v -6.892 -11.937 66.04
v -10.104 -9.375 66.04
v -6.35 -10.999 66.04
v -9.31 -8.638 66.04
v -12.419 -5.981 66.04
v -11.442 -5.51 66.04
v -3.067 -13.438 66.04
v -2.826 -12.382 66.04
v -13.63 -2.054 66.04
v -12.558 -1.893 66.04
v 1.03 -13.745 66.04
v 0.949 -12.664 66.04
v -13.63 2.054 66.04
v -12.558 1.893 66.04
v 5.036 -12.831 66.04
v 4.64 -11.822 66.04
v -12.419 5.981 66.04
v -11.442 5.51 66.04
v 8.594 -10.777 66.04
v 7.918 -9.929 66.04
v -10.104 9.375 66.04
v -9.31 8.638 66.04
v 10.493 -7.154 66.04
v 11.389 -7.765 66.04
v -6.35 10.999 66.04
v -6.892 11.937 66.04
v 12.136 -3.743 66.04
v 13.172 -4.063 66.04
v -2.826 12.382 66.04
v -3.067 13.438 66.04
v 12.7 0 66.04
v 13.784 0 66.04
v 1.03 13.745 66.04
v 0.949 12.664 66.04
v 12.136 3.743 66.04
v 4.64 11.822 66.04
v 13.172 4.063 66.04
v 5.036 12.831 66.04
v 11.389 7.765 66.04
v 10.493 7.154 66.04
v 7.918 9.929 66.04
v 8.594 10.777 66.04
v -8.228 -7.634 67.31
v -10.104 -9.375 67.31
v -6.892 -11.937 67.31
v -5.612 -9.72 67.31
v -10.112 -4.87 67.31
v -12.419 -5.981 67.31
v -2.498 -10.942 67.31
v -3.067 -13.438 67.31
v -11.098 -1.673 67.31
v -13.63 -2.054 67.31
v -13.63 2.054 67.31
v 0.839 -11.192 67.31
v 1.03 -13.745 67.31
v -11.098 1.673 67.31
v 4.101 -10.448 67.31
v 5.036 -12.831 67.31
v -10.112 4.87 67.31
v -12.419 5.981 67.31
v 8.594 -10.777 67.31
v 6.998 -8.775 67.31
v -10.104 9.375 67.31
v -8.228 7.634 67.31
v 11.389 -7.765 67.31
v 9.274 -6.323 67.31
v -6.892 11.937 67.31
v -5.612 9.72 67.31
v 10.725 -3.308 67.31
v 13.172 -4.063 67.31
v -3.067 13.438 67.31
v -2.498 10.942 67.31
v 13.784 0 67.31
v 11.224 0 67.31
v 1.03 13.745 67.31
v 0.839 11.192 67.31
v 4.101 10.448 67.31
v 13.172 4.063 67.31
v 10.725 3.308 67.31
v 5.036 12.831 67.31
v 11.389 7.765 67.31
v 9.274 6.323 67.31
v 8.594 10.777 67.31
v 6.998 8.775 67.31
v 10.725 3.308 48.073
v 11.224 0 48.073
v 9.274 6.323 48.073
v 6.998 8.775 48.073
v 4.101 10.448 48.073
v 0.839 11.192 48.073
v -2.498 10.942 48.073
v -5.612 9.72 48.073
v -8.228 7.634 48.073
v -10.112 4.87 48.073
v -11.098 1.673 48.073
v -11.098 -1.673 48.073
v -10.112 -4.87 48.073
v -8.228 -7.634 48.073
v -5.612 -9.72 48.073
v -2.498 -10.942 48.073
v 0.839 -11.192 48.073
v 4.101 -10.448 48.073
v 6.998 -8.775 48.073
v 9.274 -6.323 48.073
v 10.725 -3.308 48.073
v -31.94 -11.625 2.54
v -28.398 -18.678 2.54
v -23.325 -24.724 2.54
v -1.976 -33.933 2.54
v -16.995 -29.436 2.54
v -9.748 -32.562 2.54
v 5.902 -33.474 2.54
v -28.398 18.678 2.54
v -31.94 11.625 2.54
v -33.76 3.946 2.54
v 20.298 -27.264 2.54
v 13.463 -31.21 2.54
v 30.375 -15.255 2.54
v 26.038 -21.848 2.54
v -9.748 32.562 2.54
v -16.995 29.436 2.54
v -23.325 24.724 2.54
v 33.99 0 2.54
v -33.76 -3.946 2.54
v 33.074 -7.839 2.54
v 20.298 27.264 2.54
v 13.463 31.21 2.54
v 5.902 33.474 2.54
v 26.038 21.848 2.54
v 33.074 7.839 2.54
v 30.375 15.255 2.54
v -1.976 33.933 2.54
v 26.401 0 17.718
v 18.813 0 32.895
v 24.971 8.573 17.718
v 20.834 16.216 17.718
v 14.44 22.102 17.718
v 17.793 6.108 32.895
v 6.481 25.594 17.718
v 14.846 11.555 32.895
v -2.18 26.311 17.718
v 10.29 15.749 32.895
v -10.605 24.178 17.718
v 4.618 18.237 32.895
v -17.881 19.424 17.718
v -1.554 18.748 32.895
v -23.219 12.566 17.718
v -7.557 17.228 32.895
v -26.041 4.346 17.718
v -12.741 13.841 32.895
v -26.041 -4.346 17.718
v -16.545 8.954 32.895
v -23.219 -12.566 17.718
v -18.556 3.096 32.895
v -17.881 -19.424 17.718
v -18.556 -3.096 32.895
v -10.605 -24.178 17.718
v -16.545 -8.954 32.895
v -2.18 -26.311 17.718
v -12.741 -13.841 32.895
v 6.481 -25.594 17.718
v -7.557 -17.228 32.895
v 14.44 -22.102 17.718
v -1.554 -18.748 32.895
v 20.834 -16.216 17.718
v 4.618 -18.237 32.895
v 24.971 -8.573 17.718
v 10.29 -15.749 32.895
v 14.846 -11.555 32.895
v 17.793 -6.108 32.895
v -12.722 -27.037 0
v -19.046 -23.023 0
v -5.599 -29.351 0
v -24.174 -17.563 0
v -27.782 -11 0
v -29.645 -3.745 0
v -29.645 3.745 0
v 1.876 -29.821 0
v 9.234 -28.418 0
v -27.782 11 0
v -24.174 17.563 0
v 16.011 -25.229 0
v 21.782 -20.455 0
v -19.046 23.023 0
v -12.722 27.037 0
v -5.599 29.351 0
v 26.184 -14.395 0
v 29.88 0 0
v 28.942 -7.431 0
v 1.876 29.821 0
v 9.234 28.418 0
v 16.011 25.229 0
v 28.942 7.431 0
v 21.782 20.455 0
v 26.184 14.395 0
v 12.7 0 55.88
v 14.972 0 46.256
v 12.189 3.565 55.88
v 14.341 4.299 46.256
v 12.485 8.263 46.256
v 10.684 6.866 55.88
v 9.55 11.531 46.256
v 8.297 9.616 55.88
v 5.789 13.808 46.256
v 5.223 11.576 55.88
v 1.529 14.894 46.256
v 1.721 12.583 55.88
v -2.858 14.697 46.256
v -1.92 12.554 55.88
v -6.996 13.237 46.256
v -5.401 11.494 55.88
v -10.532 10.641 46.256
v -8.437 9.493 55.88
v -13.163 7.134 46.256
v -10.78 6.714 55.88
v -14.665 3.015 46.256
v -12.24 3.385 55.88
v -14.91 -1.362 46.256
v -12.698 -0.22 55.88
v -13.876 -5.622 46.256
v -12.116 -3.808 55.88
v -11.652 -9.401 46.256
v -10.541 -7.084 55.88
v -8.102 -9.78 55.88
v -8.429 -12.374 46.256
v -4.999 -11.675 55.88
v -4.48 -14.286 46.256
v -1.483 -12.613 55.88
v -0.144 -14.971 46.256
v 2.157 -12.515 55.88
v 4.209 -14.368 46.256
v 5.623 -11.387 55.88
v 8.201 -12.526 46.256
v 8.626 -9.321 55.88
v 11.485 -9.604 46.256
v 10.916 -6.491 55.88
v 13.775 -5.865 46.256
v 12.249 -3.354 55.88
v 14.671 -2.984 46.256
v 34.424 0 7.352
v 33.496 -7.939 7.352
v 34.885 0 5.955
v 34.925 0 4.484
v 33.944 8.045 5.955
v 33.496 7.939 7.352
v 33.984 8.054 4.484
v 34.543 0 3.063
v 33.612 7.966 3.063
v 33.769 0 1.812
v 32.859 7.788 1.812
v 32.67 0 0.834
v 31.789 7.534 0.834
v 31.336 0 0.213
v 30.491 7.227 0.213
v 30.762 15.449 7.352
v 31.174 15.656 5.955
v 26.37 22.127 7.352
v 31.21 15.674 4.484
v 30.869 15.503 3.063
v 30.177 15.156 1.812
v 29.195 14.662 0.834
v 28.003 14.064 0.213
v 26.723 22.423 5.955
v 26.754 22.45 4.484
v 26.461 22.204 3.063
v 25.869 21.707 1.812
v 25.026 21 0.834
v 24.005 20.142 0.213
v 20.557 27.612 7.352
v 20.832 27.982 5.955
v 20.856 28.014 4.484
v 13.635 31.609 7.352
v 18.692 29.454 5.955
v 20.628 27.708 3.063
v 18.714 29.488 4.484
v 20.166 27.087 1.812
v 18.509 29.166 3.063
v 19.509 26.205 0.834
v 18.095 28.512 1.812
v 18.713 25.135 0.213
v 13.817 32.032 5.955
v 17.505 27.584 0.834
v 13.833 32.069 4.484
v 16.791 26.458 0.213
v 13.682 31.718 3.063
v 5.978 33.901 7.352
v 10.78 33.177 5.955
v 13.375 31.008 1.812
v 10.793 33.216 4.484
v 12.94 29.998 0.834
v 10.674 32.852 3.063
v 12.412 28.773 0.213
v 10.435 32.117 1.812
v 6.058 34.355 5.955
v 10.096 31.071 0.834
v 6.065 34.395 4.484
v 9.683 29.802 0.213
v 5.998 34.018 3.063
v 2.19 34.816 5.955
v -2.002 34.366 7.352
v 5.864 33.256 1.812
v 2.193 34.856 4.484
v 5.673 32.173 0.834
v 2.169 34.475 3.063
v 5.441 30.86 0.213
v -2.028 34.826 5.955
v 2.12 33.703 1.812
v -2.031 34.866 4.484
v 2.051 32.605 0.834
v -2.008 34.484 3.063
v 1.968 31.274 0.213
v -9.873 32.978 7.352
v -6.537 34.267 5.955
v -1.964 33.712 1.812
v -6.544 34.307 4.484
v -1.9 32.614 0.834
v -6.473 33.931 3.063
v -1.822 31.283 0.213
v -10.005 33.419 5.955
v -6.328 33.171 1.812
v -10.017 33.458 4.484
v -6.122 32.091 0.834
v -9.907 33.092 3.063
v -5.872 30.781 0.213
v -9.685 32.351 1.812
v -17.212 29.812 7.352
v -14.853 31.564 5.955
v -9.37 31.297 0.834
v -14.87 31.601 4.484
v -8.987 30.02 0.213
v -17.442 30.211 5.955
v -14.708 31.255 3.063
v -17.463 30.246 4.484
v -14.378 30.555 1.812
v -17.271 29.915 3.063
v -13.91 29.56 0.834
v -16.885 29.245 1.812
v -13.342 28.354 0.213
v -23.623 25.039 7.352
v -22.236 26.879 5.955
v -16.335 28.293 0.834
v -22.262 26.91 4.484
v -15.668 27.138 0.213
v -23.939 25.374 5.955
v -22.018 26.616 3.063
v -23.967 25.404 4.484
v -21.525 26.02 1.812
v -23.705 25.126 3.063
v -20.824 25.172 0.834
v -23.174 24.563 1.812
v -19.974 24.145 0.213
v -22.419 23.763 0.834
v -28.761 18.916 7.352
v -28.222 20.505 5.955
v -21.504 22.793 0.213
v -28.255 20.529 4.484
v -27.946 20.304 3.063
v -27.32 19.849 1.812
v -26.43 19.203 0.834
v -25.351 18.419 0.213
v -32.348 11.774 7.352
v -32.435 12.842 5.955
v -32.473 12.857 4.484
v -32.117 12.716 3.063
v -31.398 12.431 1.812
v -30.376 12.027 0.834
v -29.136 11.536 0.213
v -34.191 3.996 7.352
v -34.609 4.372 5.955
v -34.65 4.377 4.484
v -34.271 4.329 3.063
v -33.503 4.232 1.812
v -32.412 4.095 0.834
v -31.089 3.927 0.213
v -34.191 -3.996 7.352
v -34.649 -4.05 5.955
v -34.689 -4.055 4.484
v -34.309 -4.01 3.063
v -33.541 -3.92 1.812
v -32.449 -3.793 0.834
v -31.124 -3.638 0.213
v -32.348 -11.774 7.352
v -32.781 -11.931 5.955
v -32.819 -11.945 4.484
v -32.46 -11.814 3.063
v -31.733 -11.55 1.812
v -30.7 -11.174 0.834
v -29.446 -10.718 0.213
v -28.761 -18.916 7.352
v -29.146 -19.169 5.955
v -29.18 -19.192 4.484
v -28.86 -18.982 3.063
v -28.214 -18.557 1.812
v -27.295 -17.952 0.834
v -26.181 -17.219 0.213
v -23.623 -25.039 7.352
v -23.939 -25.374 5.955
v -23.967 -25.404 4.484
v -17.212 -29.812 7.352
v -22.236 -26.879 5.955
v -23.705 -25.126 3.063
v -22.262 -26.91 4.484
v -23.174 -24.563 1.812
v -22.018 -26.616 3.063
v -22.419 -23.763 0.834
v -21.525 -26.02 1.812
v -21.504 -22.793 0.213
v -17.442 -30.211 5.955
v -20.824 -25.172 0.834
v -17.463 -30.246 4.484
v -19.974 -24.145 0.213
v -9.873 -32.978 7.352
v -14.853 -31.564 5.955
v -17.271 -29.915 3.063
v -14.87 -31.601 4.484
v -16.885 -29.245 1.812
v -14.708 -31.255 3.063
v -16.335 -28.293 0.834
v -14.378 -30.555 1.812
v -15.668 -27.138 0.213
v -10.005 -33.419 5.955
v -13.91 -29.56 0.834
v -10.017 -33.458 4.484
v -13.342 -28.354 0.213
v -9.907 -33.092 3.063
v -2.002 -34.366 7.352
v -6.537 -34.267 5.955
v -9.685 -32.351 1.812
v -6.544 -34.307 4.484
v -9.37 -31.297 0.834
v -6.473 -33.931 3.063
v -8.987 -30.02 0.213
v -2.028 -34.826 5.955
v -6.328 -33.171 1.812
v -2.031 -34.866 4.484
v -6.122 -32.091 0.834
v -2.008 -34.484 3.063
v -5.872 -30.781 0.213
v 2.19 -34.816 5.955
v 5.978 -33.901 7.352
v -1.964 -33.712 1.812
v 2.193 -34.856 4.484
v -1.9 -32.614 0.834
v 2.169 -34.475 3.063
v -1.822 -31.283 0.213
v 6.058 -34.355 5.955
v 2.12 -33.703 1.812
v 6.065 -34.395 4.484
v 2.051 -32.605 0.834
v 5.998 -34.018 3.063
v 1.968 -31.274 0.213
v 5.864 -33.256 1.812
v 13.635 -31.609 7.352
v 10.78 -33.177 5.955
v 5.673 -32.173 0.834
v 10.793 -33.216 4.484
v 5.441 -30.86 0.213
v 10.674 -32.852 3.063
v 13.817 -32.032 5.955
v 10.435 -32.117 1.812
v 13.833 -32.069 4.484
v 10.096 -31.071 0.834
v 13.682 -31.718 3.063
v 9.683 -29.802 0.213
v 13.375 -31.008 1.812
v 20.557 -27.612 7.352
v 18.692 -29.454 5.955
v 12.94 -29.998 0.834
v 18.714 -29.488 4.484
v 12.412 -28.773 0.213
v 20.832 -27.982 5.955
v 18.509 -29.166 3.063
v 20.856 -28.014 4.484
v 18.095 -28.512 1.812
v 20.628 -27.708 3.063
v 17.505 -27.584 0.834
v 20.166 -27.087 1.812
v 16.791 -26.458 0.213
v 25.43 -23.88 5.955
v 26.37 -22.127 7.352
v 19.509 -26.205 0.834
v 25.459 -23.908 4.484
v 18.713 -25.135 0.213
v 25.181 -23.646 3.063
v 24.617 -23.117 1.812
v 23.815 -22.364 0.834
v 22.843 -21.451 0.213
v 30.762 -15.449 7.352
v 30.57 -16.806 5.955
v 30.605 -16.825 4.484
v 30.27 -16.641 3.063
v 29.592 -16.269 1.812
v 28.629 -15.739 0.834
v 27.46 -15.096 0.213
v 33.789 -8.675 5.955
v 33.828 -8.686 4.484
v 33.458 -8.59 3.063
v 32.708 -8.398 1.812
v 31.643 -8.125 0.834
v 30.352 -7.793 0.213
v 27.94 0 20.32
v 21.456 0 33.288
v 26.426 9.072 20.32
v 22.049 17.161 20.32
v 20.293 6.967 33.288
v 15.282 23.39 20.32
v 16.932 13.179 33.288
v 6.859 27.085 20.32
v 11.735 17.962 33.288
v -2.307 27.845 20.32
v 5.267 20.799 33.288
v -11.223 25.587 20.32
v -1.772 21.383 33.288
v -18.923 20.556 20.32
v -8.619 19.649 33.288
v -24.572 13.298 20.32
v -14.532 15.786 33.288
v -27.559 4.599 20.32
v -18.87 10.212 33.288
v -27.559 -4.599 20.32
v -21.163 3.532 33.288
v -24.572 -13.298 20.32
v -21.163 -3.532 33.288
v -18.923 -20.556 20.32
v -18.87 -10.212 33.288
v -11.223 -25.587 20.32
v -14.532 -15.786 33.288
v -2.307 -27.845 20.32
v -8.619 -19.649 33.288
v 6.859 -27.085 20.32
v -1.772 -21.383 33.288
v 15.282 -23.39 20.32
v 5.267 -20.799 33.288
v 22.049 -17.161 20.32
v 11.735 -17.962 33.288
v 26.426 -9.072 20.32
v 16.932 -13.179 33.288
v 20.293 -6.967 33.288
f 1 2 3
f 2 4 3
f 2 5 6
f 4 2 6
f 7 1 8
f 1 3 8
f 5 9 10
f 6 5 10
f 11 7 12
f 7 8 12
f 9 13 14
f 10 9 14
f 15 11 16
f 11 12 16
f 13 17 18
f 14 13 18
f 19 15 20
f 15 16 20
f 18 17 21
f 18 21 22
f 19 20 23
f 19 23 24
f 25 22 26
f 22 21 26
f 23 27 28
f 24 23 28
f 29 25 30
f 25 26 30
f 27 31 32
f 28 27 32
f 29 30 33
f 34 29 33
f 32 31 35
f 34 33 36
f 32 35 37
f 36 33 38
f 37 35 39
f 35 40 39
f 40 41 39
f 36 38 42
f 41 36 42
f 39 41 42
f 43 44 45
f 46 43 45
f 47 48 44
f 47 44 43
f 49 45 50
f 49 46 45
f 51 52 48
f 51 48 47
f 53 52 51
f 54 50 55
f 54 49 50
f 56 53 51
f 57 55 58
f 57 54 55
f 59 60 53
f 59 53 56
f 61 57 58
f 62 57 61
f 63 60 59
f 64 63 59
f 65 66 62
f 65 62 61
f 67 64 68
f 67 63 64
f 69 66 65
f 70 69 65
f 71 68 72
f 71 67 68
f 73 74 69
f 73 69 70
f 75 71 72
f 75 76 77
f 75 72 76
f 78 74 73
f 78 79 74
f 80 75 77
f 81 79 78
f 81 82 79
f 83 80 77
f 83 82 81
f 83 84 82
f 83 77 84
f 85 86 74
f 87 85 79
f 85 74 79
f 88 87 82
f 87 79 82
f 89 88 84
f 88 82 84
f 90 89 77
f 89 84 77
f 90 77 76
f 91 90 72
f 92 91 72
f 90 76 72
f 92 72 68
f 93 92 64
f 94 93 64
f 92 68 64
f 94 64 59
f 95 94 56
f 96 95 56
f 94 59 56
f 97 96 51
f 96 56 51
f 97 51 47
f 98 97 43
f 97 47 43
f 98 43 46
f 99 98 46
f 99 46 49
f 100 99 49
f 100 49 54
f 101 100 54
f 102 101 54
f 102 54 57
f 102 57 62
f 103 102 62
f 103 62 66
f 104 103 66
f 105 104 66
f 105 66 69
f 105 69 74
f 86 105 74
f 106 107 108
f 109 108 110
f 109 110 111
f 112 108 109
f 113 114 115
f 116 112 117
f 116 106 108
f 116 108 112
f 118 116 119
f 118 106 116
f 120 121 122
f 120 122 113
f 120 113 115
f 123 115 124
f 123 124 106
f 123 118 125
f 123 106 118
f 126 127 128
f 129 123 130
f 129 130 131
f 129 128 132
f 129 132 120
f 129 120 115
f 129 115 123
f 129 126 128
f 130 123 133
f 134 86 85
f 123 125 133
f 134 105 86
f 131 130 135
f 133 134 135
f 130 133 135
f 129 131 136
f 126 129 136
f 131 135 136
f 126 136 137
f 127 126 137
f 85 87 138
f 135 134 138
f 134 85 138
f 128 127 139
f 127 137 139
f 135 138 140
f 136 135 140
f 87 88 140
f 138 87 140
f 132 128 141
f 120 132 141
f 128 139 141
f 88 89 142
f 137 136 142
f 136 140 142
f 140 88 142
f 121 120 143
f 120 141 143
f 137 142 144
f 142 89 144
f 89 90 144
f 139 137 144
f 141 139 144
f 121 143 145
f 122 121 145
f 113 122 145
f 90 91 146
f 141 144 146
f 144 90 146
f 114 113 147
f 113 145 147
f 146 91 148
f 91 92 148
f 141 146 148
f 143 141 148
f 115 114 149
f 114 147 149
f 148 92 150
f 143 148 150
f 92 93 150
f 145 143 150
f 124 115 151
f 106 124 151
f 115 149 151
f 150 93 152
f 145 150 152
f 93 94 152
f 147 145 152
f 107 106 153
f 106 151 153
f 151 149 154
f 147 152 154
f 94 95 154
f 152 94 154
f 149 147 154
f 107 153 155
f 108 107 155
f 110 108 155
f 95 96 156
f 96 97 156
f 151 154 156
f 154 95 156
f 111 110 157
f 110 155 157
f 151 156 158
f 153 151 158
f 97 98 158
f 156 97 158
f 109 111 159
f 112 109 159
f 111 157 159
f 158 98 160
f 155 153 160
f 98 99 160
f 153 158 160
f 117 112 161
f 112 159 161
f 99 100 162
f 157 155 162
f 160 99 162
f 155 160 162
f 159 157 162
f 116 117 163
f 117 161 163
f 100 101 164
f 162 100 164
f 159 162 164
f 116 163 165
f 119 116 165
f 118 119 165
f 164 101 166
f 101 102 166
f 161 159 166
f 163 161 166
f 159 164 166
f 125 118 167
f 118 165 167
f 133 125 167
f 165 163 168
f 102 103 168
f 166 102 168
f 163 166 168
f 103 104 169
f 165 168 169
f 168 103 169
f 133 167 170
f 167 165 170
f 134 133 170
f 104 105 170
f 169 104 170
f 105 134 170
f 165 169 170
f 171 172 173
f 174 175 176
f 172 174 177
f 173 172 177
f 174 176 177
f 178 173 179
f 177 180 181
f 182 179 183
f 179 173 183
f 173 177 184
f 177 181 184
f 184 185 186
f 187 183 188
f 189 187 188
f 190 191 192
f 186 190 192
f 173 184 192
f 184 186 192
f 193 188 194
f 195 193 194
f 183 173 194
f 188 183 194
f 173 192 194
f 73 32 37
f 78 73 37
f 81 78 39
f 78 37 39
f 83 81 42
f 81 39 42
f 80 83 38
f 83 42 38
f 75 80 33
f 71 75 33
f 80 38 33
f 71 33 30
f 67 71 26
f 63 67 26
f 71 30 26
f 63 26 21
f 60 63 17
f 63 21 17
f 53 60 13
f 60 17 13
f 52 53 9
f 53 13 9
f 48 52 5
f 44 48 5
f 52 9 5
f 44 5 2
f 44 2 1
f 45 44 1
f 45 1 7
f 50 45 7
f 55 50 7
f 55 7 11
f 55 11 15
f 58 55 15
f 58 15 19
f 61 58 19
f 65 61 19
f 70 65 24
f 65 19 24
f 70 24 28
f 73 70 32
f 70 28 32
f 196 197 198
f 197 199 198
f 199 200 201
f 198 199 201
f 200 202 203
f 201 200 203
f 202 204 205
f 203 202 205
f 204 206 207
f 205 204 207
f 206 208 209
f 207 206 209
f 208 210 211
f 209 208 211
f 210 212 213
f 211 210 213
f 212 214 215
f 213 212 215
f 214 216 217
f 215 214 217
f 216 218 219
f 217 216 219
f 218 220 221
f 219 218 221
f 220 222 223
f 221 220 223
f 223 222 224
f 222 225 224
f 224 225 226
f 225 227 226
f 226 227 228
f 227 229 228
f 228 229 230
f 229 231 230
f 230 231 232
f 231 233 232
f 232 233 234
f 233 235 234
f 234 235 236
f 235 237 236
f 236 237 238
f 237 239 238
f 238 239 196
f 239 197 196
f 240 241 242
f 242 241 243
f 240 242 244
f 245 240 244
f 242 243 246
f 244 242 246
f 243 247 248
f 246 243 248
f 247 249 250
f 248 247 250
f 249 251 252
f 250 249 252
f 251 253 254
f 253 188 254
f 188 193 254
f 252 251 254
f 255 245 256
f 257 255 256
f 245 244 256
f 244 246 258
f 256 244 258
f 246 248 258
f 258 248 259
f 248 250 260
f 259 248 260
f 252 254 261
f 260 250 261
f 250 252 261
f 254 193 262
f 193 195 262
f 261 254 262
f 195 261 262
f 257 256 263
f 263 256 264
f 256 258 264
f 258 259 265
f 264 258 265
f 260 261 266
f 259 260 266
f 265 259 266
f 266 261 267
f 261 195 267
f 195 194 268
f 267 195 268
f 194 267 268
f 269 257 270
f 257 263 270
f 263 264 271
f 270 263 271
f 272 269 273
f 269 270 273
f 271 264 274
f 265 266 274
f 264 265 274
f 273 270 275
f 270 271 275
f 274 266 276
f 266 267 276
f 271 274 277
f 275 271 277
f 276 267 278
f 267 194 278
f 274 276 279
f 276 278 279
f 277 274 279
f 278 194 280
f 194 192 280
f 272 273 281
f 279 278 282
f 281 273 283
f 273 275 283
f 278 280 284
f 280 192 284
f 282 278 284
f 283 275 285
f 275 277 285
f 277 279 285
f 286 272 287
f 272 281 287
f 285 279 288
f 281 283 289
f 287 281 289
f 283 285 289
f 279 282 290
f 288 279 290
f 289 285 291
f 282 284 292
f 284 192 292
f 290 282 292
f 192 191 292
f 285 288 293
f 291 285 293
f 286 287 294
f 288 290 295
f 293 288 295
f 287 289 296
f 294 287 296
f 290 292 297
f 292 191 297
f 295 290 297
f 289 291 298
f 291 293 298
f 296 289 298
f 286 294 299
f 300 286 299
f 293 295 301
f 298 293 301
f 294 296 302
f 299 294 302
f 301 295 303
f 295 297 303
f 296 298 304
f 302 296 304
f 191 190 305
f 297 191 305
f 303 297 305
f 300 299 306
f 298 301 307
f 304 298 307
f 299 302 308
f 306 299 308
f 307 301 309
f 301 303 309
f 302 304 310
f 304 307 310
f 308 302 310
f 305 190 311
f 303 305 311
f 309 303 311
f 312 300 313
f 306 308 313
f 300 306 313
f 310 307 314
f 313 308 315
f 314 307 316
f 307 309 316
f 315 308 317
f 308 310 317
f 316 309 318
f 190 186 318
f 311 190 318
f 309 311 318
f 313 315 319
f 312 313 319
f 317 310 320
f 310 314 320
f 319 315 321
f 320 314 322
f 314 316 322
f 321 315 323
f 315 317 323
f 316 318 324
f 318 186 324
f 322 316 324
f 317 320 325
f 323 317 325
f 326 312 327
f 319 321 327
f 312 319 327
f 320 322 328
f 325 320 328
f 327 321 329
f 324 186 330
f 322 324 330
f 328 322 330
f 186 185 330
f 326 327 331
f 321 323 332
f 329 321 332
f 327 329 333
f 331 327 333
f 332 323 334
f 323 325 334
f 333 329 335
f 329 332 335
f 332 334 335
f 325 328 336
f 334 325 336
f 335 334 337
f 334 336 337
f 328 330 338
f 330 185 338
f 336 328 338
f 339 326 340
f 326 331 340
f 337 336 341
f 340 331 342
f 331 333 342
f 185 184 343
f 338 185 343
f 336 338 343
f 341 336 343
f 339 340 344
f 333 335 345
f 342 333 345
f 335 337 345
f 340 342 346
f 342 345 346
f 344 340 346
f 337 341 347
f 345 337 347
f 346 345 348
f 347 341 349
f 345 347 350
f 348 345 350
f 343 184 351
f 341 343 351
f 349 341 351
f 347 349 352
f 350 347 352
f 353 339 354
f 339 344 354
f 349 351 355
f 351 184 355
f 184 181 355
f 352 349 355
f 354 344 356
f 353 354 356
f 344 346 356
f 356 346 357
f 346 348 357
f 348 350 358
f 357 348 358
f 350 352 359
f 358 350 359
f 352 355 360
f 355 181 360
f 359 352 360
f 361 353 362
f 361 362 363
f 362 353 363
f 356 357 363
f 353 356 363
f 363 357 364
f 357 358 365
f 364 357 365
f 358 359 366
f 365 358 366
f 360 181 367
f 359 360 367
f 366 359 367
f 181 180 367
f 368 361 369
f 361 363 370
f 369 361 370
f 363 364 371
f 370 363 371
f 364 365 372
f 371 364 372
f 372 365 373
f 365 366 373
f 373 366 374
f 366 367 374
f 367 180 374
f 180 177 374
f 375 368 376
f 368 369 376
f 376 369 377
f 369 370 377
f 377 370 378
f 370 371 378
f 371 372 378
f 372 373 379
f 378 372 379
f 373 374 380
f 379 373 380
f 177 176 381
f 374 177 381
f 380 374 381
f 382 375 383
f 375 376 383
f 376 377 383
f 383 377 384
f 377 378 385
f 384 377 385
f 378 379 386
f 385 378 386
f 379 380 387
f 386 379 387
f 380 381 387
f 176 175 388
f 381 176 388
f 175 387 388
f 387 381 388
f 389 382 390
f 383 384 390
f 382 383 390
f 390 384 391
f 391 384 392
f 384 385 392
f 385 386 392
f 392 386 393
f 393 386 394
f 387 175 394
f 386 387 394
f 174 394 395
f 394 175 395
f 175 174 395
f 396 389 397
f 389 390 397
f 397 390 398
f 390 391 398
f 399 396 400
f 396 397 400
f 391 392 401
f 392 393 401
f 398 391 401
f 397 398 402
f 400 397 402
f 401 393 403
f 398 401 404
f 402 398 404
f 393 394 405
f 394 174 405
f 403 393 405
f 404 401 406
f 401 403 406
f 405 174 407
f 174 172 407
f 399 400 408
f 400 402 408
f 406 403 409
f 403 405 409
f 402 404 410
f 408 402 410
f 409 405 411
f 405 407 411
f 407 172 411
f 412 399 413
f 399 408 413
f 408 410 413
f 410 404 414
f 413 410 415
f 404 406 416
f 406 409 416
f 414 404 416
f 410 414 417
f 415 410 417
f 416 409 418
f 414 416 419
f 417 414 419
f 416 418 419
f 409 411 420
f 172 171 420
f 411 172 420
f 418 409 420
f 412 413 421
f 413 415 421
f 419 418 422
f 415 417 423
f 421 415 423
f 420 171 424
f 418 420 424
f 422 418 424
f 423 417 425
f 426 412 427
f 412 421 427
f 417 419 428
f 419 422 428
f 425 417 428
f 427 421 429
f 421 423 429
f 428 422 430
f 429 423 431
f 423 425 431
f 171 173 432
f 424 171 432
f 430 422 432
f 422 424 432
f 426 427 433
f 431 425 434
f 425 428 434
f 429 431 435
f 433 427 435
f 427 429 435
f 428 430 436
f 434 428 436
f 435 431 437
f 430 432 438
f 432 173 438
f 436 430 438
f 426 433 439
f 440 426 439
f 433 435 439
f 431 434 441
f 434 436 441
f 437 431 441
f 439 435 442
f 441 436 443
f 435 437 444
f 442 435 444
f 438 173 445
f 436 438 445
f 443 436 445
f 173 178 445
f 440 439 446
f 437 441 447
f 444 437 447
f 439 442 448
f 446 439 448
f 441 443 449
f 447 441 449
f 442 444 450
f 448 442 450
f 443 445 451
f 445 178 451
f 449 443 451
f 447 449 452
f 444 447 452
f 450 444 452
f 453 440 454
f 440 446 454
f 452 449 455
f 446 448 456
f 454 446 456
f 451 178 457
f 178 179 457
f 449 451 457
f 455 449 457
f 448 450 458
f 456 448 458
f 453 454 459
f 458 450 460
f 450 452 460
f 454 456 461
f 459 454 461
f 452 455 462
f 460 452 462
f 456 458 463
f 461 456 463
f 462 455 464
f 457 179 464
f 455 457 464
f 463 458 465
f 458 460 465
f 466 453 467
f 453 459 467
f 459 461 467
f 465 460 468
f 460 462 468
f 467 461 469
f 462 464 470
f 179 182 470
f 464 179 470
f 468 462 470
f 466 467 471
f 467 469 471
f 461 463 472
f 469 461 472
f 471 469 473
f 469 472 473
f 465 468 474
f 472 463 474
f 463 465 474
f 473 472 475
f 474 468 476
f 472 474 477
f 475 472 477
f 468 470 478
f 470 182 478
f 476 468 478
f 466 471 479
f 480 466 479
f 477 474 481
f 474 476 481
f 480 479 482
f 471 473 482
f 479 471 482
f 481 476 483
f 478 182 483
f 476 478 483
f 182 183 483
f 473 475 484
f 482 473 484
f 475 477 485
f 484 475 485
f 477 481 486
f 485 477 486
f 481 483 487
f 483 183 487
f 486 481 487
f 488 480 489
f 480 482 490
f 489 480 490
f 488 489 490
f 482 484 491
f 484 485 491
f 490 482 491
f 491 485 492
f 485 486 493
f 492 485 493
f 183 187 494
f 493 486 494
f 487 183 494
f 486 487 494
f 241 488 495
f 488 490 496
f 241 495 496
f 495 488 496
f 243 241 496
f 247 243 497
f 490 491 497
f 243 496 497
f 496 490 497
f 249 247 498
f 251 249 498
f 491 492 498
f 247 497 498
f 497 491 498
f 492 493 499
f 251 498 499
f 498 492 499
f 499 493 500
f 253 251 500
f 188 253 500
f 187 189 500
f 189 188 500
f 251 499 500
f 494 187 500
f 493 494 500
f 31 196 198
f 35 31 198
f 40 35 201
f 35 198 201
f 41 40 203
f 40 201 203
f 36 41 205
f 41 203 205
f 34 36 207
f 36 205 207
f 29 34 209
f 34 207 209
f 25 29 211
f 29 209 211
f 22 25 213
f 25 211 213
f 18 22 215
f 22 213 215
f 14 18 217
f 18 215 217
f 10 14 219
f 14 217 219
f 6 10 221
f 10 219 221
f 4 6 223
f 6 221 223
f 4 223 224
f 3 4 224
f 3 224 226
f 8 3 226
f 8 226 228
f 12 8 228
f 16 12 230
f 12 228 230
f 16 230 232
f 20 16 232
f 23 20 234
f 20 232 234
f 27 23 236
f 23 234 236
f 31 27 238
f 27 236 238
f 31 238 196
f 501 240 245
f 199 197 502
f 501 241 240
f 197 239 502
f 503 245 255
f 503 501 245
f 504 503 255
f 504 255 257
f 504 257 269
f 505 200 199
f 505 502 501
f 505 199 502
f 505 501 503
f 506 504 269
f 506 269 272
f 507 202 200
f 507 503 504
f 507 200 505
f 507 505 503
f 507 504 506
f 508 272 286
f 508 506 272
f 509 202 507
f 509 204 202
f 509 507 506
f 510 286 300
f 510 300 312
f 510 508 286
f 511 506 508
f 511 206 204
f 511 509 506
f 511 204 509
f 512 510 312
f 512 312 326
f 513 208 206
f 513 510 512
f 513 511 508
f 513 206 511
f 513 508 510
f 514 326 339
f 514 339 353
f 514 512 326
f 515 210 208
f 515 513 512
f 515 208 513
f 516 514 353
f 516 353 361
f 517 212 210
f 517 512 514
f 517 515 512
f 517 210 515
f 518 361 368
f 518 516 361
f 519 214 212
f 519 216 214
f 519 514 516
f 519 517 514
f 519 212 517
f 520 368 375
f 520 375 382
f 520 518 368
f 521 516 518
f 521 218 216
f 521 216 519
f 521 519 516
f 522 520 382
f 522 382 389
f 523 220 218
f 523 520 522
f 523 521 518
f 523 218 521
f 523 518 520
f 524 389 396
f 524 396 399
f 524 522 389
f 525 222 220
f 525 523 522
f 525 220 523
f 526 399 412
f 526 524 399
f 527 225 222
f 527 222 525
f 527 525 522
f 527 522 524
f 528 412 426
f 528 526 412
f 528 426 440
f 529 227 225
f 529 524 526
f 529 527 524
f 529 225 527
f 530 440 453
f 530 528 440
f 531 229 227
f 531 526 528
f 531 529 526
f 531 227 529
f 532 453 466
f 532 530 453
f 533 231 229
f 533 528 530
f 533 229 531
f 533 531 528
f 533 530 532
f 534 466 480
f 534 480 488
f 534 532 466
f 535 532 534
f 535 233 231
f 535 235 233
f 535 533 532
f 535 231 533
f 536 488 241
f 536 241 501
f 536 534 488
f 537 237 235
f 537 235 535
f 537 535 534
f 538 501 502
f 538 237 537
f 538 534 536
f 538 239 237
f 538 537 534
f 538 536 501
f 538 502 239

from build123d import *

# Parameters (mm, degrees)
F0_R      = 38.1
F2_R      = 12.7
F4_T      = -2.54
F5_R      = 12.7
F6_DEPTH  = 15.24
F7_R      = 10.5636642446
F8_DEPTH  = 53.34
F9_R      = 5.08
F10_SIZE  = 5.08
F11_R     = 13.7839746561
F12_DEPTH = 1.27
F13_R     = 11.2237856043
F14_DEPTH = 101.6
F16_R     = 11.2237856043
F17_DEPTH = 2.54


with BuildPart() as f3:
    # F0 (on Top) → F3 section 0
    with BuildSketch(Plane.XY):
        Circle(F0_R)
    # F2 (on offset) → F3 section 1
    with BuildSketch(Plane.XY.offset(50.8)):
        Circle(F2_R)
    loft()

    # F4
    f4_openings = [f3.faces().sort_by_distance(p)[0] for p in [
        (0, 0, 50.8),
    ]]
    offset(amount=F4_T, openings=f4_openings, kind=Kind.INTERSECTION)

    # F5 (on offset) → F6 (join)
    with BuildSketch(Plane.XY.offset(50.8)):
        Circle(F5_R)
    extrude(amount=F6_DEPTH)

    # F7 (on face) → F8 (cut)
    with BuildSketch(Plane.XY.offset(66.04)):
        Circle(F7_R)
    extrude(amount=-F8_DEPTH, mode=Mode.SUBTRACT)

    # F9
    f9_edges = [f3.edges().sort_by_distance(p)[0] for p in [
        (-38.1, 0, 0),
    ]]
    fillet(f9_edges, radius=F9_R)

    # F10
    f10_edges = [f3.edges().sort_by_distance(p)[0] for p in [
        (-12.7, 0, 50.8),
    ]]
    chamfer(f10_edges, length=F10_SIZE)

    # F11 (on face) → F12 (join)
    with BuildSketch(Plane.XY.offset(66.04)):
        Circle(F11_R)
    extrude(amount=F12_DEPTH)

    # F13 (on face) → F14 (cut)
    with BuildSketch(Plane.XY.offset(67.31)):
        Circle(F13_R)
    extrude(amount=-F14_DEPTH, mode=Mode.SUBTRACT)

    # F16 (on offset) → F17 (join)
    with BuildSketch(Plane.XY):
        Circle(F16_R)
    extrude(amount=F17_DEPTH)


solid = f3.part
